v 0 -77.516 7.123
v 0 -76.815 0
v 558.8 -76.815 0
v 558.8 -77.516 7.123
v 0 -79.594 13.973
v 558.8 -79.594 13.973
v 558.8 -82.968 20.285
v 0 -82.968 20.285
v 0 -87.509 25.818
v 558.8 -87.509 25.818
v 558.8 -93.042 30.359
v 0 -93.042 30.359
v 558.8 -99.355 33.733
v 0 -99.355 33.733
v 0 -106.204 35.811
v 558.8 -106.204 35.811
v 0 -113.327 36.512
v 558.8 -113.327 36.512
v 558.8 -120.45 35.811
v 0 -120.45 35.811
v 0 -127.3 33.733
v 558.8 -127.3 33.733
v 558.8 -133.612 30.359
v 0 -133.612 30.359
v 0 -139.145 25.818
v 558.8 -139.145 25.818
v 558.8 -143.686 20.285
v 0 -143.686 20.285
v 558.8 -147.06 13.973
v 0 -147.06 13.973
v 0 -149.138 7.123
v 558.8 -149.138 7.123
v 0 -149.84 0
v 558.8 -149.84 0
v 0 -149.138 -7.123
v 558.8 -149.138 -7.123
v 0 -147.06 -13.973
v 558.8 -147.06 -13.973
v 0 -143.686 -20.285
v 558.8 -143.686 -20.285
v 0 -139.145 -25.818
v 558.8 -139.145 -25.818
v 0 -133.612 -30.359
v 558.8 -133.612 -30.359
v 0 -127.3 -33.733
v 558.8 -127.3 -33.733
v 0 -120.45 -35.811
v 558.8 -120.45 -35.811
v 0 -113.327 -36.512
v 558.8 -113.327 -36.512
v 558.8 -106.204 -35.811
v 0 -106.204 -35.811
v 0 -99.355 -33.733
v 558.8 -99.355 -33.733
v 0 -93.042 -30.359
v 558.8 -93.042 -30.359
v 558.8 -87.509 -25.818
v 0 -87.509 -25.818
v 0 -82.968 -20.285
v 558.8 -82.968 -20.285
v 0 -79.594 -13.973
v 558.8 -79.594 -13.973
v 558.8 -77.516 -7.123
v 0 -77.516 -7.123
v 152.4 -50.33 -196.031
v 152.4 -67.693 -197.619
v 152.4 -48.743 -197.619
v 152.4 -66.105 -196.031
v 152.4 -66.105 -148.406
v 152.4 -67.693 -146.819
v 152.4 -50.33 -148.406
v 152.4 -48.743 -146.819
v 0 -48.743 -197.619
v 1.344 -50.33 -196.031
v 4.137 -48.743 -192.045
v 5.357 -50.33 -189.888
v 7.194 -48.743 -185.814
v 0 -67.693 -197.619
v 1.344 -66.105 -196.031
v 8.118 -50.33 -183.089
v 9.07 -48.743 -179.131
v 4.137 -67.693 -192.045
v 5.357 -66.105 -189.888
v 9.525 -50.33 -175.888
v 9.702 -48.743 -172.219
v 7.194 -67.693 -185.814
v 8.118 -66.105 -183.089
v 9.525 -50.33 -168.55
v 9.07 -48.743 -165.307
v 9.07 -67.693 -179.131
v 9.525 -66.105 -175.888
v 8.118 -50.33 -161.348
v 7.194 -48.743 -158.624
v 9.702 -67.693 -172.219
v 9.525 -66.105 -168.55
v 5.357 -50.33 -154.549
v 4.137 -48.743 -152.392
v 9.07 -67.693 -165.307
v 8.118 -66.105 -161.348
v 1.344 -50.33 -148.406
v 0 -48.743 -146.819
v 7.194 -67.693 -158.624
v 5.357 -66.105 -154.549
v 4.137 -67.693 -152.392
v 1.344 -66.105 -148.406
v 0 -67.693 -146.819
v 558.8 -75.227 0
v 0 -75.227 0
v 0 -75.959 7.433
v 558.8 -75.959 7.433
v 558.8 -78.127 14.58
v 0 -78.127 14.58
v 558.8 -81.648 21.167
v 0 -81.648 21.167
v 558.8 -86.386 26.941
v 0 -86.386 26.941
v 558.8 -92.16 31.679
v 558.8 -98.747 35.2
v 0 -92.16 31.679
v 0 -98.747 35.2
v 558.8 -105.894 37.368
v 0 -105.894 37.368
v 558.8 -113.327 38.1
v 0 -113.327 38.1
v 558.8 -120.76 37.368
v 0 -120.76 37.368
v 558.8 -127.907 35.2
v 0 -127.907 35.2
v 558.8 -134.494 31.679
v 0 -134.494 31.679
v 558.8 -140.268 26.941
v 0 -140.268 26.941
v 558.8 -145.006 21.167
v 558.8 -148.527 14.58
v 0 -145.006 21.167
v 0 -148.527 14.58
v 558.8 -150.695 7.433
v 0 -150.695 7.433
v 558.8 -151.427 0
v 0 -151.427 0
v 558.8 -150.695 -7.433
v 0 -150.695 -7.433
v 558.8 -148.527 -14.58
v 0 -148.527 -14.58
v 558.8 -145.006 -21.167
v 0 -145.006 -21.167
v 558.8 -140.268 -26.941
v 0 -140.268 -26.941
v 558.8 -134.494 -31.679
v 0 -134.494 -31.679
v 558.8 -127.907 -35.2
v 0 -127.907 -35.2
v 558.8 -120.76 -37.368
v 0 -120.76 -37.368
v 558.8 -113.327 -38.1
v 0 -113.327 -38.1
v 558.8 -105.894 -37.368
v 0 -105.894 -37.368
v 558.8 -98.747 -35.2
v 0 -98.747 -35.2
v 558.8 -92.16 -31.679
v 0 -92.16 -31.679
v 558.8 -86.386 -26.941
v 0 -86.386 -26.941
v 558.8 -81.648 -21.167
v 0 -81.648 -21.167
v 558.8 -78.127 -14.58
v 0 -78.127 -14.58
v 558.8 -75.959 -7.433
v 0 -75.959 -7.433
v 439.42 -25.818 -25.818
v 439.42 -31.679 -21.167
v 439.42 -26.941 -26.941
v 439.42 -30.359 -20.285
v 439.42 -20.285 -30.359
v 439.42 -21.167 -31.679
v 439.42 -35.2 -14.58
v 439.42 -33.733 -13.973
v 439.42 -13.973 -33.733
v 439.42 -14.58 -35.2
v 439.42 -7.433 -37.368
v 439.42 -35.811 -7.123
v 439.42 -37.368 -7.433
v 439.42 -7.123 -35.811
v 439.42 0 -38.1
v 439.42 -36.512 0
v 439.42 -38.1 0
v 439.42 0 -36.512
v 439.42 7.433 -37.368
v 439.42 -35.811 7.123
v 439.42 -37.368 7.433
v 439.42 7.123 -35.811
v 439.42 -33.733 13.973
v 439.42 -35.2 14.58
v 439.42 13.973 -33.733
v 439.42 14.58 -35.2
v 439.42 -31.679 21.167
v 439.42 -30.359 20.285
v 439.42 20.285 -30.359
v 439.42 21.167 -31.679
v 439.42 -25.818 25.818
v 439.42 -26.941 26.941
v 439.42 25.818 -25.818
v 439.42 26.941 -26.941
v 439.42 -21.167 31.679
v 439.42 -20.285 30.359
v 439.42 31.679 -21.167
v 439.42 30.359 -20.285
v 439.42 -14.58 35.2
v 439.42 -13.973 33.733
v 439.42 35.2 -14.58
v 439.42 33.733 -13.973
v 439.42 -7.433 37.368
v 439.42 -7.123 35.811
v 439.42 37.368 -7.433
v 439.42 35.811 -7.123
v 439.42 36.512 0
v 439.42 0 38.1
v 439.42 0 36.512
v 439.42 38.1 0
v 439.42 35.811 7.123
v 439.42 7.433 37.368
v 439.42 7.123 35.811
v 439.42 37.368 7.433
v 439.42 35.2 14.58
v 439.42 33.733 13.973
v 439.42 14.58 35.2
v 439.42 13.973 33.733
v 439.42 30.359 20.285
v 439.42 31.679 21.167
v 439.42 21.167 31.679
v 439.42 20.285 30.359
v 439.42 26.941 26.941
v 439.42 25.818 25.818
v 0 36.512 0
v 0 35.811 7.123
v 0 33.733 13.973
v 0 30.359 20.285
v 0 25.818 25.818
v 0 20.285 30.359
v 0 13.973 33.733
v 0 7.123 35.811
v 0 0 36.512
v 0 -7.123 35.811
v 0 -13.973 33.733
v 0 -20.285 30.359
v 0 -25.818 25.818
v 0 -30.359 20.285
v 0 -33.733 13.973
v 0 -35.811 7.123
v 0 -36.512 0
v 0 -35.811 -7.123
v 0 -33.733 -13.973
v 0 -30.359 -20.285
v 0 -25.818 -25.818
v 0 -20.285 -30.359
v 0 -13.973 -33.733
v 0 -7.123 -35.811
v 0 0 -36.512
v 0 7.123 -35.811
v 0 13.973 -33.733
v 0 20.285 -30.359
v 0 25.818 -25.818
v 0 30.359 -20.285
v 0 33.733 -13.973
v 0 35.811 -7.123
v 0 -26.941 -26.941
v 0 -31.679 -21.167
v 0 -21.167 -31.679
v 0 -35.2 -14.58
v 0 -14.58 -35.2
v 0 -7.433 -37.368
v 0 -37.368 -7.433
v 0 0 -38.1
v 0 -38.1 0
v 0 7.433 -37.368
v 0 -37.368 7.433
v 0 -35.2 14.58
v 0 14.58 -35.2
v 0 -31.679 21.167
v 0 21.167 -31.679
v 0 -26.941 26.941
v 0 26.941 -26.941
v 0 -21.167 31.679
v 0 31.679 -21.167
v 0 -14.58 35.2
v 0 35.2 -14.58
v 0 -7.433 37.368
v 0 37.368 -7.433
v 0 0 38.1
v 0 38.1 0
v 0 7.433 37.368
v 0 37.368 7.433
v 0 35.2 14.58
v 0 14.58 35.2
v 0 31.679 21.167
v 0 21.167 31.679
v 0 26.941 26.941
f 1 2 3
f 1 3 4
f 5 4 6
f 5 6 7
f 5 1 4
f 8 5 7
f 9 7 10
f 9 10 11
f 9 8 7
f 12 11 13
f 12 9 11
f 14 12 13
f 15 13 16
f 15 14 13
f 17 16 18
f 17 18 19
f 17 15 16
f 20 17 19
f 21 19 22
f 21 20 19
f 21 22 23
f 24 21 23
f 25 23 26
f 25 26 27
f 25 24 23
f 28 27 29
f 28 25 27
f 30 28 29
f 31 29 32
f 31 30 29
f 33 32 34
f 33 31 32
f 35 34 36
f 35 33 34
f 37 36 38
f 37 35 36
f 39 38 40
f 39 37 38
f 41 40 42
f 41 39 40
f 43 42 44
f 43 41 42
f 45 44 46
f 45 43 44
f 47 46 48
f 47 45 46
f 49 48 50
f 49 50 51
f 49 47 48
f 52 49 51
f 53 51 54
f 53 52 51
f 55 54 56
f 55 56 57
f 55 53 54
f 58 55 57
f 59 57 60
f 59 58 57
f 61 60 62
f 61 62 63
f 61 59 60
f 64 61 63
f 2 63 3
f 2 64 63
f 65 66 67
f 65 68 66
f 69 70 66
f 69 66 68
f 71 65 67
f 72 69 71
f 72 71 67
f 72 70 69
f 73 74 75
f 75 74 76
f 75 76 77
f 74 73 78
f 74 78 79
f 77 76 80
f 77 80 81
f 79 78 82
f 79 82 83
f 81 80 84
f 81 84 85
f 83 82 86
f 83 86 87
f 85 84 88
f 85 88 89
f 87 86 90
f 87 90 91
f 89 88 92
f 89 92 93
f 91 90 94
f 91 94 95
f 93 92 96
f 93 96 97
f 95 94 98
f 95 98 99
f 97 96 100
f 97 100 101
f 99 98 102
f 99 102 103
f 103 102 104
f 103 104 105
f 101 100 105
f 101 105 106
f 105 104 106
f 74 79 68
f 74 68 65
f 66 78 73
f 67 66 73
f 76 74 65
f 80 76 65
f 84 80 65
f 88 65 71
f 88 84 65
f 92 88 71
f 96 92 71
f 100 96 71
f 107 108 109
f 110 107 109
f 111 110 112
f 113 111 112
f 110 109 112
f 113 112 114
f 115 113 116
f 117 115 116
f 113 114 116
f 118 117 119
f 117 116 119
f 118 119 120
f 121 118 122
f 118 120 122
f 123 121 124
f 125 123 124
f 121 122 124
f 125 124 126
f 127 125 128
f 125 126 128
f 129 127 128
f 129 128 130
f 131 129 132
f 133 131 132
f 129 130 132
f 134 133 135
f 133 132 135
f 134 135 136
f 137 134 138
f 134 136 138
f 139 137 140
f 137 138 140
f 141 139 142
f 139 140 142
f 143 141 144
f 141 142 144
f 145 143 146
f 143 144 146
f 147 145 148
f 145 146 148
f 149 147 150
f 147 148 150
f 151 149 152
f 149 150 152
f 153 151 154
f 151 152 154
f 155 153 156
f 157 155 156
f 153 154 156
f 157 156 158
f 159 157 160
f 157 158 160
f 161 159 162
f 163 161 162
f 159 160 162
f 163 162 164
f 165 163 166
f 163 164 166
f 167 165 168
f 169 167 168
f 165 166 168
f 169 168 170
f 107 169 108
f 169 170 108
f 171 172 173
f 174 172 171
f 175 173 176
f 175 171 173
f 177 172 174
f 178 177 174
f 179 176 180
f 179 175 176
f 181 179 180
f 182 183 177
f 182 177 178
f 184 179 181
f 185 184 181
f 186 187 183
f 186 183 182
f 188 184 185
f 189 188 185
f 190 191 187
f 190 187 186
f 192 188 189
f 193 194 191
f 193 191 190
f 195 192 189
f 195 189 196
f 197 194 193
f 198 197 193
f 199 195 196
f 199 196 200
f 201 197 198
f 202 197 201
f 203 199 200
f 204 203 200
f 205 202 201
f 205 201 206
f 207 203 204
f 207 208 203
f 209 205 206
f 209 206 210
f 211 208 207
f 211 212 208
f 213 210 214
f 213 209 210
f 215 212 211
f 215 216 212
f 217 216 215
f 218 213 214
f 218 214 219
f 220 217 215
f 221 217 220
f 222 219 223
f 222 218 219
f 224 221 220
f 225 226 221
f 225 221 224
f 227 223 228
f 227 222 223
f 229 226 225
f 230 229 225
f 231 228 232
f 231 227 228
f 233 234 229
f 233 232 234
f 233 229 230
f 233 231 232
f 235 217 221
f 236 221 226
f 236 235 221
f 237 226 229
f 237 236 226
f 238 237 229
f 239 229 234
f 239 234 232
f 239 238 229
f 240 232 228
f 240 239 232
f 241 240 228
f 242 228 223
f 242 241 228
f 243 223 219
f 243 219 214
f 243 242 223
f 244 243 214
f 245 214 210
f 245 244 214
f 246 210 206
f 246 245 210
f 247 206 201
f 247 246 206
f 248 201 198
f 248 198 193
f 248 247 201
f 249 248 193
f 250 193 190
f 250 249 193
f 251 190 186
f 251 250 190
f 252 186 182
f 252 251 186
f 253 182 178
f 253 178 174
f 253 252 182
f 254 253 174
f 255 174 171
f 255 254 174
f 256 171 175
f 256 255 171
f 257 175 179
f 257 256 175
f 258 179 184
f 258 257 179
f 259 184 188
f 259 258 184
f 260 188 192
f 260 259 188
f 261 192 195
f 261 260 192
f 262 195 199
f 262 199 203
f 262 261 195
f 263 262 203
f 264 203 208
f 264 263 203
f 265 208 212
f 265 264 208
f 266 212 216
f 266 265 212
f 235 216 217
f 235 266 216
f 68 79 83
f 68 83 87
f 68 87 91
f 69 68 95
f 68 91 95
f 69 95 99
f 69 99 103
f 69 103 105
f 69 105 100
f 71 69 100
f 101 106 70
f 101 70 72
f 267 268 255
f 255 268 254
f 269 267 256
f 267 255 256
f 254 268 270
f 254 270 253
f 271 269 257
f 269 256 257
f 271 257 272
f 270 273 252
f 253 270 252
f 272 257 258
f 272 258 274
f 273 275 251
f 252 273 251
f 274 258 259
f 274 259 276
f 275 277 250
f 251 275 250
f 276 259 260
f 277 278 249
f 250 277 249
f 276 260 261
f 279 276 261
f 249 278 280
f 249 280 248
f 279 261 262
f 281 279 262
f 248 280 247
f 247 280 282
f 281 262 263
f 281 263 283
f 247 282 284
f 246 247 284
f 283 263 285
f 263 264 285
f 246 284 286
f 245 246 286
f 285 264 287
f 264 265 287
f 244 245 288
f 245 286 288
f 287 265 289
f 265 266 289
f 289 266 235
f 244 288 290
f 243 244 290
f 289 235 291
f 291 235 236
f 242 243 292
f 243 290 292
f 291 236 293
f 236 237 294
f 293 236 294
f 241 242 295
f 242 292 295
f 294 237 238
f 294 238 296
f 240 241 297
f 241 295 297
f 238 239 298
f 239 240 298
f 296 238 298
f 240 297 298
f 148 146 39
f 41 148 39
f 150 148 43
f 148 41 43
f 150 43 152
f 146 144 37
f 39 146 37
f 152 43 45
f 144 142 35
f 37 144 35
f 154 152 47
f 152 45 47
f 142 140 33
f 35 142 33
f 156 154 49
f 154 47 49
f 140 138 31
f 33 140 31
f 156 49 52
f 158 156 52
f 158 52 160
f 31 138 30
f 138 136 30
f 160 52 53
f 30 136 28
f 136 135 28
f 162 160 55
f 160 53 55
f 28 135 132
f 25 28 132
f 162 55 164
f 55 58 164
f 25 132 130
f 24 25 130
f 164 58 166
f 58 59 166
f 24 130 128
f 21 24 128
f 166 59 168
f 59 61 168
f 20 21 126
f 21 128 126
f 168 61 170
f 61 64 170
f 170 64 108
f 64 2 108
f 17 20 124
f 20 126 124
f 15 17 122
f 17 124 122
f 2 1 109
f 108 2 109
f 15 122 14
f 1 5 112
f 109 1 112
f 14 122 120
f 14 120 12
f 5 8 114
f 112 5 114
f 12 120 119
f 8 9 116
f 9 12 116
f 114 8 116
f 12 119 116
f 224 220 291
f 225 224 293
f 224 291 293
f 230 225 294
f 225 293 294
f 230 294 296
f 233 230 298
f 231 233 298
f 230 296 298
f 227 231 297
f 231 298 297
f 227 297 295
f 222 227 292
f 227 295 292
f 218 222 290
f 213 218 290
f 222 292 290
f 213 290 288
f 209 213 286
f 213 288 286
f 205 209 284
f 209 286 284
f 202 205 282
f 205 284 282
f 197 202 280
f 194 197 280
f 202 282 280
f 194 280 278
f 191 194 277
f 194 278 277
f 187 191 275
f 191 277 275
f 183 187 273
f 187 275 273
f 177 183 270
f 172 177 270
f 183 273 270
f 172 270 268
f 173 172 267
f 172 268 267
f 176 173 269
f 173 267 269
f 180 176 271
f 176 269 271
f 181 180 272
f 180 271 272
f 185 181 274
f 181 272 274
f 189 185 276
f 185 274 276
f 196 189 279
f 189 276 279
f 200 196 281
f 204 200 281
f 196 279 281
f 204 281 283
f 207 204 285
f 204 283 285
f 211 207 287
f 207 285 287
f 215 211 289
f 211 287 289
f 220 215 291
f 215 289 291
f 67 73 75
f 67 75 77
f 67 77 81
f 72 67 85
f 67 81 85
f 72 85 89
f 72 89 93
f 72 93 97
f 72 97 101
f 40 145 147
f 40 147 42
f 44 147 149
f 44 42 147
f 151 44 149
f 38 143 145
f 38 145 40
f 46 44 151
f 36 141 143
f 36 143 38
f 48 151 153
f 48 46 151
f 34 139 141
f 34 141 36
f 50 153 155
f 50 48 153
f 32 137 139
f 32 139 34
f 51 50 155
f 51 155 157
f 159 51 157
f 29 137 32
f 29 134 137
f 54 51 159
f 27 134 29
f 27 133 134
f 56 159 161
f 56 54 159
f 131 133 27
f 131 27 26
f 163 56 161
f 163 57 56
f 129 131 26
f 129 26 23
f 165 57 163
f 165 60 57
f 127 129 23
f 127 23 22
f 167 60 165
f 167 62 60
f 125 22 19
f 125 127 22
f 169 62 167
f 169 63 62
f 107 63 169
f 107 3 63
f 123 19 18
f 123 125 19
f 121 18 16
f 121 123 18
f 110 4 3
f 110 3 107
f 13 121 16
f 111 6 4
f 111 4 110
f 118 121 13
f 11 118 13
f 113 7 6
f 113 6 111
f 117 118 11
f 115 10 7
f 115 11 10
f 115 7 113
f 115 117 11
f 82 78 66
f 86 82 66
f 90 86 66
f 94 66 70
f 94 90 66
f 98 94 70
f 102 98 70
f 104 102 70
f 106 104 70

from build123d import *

# Parameters (mm, degrees)
F0_R     = 38.1
F0_R_2   = 36.5125
F1_DEPTH = 439.42
F2_R     = 38.1
F2_R_2   = 36.5125
F3_DEPTH = 558.8
F4_W     = 18.949736
F4_H     = 50.8
F4_W_2   = 15.774736
F4_H_2   = 47.625
F5_DEPTH = 152.4
F7_DEPTH = 50.8


with BuildPart() as f1:
    # F0 (on Right) → F1 (new body)
    with BuildSketch(Plane.YZ):
        Circle(F0_R)
        Circle(F0_R_2, mode=Mode.SUBTRACT)
    extrude(amount=F1_DEPTH)


with BuildPart() as f3:
    # F2 (on Right) → F3 (new body)
    with BuildSketch(Plane.YZ):
        with Locations((-113.327235, 0)):
            Circle(F2_R)
        with Locations((-113.327235, 0)):
            Circle(F2_R_2, mode=Mode.SUBTRACT)
    extrude(amount=F3_DEPTH)


with BuildPart() as f5:
    # F4 (on Right) → F5 (new body)
    with BuildSketch(Plane.YZ):
        with Locations((-58.217695, -172.218693)):
            Rectangle(F4_W, F4_H)
        with Locations((-58.217695, -172.218693)):
            Rectangle(F4_W_2, F4_H_2, mode=Mode.SUBTRACT)
    extrude(amount=F5_DEPTH)

    # F6 (on face) → F7 (cut)
    with BuildSketch(Plane.XZ.offset(67.692563)):
        with BuildLine():
            Line((0, -146.818693), (0, -197.618693))
            ThreePointArc((0, -197.618693), (9.701937, -172.218693), (0, -146.818693))
        make_face()
    extrude(amount=-F7_DEPTH, mode=Mode.SUBTRACT)


solid = Compound([f1.part, f3.part, f5.part])
